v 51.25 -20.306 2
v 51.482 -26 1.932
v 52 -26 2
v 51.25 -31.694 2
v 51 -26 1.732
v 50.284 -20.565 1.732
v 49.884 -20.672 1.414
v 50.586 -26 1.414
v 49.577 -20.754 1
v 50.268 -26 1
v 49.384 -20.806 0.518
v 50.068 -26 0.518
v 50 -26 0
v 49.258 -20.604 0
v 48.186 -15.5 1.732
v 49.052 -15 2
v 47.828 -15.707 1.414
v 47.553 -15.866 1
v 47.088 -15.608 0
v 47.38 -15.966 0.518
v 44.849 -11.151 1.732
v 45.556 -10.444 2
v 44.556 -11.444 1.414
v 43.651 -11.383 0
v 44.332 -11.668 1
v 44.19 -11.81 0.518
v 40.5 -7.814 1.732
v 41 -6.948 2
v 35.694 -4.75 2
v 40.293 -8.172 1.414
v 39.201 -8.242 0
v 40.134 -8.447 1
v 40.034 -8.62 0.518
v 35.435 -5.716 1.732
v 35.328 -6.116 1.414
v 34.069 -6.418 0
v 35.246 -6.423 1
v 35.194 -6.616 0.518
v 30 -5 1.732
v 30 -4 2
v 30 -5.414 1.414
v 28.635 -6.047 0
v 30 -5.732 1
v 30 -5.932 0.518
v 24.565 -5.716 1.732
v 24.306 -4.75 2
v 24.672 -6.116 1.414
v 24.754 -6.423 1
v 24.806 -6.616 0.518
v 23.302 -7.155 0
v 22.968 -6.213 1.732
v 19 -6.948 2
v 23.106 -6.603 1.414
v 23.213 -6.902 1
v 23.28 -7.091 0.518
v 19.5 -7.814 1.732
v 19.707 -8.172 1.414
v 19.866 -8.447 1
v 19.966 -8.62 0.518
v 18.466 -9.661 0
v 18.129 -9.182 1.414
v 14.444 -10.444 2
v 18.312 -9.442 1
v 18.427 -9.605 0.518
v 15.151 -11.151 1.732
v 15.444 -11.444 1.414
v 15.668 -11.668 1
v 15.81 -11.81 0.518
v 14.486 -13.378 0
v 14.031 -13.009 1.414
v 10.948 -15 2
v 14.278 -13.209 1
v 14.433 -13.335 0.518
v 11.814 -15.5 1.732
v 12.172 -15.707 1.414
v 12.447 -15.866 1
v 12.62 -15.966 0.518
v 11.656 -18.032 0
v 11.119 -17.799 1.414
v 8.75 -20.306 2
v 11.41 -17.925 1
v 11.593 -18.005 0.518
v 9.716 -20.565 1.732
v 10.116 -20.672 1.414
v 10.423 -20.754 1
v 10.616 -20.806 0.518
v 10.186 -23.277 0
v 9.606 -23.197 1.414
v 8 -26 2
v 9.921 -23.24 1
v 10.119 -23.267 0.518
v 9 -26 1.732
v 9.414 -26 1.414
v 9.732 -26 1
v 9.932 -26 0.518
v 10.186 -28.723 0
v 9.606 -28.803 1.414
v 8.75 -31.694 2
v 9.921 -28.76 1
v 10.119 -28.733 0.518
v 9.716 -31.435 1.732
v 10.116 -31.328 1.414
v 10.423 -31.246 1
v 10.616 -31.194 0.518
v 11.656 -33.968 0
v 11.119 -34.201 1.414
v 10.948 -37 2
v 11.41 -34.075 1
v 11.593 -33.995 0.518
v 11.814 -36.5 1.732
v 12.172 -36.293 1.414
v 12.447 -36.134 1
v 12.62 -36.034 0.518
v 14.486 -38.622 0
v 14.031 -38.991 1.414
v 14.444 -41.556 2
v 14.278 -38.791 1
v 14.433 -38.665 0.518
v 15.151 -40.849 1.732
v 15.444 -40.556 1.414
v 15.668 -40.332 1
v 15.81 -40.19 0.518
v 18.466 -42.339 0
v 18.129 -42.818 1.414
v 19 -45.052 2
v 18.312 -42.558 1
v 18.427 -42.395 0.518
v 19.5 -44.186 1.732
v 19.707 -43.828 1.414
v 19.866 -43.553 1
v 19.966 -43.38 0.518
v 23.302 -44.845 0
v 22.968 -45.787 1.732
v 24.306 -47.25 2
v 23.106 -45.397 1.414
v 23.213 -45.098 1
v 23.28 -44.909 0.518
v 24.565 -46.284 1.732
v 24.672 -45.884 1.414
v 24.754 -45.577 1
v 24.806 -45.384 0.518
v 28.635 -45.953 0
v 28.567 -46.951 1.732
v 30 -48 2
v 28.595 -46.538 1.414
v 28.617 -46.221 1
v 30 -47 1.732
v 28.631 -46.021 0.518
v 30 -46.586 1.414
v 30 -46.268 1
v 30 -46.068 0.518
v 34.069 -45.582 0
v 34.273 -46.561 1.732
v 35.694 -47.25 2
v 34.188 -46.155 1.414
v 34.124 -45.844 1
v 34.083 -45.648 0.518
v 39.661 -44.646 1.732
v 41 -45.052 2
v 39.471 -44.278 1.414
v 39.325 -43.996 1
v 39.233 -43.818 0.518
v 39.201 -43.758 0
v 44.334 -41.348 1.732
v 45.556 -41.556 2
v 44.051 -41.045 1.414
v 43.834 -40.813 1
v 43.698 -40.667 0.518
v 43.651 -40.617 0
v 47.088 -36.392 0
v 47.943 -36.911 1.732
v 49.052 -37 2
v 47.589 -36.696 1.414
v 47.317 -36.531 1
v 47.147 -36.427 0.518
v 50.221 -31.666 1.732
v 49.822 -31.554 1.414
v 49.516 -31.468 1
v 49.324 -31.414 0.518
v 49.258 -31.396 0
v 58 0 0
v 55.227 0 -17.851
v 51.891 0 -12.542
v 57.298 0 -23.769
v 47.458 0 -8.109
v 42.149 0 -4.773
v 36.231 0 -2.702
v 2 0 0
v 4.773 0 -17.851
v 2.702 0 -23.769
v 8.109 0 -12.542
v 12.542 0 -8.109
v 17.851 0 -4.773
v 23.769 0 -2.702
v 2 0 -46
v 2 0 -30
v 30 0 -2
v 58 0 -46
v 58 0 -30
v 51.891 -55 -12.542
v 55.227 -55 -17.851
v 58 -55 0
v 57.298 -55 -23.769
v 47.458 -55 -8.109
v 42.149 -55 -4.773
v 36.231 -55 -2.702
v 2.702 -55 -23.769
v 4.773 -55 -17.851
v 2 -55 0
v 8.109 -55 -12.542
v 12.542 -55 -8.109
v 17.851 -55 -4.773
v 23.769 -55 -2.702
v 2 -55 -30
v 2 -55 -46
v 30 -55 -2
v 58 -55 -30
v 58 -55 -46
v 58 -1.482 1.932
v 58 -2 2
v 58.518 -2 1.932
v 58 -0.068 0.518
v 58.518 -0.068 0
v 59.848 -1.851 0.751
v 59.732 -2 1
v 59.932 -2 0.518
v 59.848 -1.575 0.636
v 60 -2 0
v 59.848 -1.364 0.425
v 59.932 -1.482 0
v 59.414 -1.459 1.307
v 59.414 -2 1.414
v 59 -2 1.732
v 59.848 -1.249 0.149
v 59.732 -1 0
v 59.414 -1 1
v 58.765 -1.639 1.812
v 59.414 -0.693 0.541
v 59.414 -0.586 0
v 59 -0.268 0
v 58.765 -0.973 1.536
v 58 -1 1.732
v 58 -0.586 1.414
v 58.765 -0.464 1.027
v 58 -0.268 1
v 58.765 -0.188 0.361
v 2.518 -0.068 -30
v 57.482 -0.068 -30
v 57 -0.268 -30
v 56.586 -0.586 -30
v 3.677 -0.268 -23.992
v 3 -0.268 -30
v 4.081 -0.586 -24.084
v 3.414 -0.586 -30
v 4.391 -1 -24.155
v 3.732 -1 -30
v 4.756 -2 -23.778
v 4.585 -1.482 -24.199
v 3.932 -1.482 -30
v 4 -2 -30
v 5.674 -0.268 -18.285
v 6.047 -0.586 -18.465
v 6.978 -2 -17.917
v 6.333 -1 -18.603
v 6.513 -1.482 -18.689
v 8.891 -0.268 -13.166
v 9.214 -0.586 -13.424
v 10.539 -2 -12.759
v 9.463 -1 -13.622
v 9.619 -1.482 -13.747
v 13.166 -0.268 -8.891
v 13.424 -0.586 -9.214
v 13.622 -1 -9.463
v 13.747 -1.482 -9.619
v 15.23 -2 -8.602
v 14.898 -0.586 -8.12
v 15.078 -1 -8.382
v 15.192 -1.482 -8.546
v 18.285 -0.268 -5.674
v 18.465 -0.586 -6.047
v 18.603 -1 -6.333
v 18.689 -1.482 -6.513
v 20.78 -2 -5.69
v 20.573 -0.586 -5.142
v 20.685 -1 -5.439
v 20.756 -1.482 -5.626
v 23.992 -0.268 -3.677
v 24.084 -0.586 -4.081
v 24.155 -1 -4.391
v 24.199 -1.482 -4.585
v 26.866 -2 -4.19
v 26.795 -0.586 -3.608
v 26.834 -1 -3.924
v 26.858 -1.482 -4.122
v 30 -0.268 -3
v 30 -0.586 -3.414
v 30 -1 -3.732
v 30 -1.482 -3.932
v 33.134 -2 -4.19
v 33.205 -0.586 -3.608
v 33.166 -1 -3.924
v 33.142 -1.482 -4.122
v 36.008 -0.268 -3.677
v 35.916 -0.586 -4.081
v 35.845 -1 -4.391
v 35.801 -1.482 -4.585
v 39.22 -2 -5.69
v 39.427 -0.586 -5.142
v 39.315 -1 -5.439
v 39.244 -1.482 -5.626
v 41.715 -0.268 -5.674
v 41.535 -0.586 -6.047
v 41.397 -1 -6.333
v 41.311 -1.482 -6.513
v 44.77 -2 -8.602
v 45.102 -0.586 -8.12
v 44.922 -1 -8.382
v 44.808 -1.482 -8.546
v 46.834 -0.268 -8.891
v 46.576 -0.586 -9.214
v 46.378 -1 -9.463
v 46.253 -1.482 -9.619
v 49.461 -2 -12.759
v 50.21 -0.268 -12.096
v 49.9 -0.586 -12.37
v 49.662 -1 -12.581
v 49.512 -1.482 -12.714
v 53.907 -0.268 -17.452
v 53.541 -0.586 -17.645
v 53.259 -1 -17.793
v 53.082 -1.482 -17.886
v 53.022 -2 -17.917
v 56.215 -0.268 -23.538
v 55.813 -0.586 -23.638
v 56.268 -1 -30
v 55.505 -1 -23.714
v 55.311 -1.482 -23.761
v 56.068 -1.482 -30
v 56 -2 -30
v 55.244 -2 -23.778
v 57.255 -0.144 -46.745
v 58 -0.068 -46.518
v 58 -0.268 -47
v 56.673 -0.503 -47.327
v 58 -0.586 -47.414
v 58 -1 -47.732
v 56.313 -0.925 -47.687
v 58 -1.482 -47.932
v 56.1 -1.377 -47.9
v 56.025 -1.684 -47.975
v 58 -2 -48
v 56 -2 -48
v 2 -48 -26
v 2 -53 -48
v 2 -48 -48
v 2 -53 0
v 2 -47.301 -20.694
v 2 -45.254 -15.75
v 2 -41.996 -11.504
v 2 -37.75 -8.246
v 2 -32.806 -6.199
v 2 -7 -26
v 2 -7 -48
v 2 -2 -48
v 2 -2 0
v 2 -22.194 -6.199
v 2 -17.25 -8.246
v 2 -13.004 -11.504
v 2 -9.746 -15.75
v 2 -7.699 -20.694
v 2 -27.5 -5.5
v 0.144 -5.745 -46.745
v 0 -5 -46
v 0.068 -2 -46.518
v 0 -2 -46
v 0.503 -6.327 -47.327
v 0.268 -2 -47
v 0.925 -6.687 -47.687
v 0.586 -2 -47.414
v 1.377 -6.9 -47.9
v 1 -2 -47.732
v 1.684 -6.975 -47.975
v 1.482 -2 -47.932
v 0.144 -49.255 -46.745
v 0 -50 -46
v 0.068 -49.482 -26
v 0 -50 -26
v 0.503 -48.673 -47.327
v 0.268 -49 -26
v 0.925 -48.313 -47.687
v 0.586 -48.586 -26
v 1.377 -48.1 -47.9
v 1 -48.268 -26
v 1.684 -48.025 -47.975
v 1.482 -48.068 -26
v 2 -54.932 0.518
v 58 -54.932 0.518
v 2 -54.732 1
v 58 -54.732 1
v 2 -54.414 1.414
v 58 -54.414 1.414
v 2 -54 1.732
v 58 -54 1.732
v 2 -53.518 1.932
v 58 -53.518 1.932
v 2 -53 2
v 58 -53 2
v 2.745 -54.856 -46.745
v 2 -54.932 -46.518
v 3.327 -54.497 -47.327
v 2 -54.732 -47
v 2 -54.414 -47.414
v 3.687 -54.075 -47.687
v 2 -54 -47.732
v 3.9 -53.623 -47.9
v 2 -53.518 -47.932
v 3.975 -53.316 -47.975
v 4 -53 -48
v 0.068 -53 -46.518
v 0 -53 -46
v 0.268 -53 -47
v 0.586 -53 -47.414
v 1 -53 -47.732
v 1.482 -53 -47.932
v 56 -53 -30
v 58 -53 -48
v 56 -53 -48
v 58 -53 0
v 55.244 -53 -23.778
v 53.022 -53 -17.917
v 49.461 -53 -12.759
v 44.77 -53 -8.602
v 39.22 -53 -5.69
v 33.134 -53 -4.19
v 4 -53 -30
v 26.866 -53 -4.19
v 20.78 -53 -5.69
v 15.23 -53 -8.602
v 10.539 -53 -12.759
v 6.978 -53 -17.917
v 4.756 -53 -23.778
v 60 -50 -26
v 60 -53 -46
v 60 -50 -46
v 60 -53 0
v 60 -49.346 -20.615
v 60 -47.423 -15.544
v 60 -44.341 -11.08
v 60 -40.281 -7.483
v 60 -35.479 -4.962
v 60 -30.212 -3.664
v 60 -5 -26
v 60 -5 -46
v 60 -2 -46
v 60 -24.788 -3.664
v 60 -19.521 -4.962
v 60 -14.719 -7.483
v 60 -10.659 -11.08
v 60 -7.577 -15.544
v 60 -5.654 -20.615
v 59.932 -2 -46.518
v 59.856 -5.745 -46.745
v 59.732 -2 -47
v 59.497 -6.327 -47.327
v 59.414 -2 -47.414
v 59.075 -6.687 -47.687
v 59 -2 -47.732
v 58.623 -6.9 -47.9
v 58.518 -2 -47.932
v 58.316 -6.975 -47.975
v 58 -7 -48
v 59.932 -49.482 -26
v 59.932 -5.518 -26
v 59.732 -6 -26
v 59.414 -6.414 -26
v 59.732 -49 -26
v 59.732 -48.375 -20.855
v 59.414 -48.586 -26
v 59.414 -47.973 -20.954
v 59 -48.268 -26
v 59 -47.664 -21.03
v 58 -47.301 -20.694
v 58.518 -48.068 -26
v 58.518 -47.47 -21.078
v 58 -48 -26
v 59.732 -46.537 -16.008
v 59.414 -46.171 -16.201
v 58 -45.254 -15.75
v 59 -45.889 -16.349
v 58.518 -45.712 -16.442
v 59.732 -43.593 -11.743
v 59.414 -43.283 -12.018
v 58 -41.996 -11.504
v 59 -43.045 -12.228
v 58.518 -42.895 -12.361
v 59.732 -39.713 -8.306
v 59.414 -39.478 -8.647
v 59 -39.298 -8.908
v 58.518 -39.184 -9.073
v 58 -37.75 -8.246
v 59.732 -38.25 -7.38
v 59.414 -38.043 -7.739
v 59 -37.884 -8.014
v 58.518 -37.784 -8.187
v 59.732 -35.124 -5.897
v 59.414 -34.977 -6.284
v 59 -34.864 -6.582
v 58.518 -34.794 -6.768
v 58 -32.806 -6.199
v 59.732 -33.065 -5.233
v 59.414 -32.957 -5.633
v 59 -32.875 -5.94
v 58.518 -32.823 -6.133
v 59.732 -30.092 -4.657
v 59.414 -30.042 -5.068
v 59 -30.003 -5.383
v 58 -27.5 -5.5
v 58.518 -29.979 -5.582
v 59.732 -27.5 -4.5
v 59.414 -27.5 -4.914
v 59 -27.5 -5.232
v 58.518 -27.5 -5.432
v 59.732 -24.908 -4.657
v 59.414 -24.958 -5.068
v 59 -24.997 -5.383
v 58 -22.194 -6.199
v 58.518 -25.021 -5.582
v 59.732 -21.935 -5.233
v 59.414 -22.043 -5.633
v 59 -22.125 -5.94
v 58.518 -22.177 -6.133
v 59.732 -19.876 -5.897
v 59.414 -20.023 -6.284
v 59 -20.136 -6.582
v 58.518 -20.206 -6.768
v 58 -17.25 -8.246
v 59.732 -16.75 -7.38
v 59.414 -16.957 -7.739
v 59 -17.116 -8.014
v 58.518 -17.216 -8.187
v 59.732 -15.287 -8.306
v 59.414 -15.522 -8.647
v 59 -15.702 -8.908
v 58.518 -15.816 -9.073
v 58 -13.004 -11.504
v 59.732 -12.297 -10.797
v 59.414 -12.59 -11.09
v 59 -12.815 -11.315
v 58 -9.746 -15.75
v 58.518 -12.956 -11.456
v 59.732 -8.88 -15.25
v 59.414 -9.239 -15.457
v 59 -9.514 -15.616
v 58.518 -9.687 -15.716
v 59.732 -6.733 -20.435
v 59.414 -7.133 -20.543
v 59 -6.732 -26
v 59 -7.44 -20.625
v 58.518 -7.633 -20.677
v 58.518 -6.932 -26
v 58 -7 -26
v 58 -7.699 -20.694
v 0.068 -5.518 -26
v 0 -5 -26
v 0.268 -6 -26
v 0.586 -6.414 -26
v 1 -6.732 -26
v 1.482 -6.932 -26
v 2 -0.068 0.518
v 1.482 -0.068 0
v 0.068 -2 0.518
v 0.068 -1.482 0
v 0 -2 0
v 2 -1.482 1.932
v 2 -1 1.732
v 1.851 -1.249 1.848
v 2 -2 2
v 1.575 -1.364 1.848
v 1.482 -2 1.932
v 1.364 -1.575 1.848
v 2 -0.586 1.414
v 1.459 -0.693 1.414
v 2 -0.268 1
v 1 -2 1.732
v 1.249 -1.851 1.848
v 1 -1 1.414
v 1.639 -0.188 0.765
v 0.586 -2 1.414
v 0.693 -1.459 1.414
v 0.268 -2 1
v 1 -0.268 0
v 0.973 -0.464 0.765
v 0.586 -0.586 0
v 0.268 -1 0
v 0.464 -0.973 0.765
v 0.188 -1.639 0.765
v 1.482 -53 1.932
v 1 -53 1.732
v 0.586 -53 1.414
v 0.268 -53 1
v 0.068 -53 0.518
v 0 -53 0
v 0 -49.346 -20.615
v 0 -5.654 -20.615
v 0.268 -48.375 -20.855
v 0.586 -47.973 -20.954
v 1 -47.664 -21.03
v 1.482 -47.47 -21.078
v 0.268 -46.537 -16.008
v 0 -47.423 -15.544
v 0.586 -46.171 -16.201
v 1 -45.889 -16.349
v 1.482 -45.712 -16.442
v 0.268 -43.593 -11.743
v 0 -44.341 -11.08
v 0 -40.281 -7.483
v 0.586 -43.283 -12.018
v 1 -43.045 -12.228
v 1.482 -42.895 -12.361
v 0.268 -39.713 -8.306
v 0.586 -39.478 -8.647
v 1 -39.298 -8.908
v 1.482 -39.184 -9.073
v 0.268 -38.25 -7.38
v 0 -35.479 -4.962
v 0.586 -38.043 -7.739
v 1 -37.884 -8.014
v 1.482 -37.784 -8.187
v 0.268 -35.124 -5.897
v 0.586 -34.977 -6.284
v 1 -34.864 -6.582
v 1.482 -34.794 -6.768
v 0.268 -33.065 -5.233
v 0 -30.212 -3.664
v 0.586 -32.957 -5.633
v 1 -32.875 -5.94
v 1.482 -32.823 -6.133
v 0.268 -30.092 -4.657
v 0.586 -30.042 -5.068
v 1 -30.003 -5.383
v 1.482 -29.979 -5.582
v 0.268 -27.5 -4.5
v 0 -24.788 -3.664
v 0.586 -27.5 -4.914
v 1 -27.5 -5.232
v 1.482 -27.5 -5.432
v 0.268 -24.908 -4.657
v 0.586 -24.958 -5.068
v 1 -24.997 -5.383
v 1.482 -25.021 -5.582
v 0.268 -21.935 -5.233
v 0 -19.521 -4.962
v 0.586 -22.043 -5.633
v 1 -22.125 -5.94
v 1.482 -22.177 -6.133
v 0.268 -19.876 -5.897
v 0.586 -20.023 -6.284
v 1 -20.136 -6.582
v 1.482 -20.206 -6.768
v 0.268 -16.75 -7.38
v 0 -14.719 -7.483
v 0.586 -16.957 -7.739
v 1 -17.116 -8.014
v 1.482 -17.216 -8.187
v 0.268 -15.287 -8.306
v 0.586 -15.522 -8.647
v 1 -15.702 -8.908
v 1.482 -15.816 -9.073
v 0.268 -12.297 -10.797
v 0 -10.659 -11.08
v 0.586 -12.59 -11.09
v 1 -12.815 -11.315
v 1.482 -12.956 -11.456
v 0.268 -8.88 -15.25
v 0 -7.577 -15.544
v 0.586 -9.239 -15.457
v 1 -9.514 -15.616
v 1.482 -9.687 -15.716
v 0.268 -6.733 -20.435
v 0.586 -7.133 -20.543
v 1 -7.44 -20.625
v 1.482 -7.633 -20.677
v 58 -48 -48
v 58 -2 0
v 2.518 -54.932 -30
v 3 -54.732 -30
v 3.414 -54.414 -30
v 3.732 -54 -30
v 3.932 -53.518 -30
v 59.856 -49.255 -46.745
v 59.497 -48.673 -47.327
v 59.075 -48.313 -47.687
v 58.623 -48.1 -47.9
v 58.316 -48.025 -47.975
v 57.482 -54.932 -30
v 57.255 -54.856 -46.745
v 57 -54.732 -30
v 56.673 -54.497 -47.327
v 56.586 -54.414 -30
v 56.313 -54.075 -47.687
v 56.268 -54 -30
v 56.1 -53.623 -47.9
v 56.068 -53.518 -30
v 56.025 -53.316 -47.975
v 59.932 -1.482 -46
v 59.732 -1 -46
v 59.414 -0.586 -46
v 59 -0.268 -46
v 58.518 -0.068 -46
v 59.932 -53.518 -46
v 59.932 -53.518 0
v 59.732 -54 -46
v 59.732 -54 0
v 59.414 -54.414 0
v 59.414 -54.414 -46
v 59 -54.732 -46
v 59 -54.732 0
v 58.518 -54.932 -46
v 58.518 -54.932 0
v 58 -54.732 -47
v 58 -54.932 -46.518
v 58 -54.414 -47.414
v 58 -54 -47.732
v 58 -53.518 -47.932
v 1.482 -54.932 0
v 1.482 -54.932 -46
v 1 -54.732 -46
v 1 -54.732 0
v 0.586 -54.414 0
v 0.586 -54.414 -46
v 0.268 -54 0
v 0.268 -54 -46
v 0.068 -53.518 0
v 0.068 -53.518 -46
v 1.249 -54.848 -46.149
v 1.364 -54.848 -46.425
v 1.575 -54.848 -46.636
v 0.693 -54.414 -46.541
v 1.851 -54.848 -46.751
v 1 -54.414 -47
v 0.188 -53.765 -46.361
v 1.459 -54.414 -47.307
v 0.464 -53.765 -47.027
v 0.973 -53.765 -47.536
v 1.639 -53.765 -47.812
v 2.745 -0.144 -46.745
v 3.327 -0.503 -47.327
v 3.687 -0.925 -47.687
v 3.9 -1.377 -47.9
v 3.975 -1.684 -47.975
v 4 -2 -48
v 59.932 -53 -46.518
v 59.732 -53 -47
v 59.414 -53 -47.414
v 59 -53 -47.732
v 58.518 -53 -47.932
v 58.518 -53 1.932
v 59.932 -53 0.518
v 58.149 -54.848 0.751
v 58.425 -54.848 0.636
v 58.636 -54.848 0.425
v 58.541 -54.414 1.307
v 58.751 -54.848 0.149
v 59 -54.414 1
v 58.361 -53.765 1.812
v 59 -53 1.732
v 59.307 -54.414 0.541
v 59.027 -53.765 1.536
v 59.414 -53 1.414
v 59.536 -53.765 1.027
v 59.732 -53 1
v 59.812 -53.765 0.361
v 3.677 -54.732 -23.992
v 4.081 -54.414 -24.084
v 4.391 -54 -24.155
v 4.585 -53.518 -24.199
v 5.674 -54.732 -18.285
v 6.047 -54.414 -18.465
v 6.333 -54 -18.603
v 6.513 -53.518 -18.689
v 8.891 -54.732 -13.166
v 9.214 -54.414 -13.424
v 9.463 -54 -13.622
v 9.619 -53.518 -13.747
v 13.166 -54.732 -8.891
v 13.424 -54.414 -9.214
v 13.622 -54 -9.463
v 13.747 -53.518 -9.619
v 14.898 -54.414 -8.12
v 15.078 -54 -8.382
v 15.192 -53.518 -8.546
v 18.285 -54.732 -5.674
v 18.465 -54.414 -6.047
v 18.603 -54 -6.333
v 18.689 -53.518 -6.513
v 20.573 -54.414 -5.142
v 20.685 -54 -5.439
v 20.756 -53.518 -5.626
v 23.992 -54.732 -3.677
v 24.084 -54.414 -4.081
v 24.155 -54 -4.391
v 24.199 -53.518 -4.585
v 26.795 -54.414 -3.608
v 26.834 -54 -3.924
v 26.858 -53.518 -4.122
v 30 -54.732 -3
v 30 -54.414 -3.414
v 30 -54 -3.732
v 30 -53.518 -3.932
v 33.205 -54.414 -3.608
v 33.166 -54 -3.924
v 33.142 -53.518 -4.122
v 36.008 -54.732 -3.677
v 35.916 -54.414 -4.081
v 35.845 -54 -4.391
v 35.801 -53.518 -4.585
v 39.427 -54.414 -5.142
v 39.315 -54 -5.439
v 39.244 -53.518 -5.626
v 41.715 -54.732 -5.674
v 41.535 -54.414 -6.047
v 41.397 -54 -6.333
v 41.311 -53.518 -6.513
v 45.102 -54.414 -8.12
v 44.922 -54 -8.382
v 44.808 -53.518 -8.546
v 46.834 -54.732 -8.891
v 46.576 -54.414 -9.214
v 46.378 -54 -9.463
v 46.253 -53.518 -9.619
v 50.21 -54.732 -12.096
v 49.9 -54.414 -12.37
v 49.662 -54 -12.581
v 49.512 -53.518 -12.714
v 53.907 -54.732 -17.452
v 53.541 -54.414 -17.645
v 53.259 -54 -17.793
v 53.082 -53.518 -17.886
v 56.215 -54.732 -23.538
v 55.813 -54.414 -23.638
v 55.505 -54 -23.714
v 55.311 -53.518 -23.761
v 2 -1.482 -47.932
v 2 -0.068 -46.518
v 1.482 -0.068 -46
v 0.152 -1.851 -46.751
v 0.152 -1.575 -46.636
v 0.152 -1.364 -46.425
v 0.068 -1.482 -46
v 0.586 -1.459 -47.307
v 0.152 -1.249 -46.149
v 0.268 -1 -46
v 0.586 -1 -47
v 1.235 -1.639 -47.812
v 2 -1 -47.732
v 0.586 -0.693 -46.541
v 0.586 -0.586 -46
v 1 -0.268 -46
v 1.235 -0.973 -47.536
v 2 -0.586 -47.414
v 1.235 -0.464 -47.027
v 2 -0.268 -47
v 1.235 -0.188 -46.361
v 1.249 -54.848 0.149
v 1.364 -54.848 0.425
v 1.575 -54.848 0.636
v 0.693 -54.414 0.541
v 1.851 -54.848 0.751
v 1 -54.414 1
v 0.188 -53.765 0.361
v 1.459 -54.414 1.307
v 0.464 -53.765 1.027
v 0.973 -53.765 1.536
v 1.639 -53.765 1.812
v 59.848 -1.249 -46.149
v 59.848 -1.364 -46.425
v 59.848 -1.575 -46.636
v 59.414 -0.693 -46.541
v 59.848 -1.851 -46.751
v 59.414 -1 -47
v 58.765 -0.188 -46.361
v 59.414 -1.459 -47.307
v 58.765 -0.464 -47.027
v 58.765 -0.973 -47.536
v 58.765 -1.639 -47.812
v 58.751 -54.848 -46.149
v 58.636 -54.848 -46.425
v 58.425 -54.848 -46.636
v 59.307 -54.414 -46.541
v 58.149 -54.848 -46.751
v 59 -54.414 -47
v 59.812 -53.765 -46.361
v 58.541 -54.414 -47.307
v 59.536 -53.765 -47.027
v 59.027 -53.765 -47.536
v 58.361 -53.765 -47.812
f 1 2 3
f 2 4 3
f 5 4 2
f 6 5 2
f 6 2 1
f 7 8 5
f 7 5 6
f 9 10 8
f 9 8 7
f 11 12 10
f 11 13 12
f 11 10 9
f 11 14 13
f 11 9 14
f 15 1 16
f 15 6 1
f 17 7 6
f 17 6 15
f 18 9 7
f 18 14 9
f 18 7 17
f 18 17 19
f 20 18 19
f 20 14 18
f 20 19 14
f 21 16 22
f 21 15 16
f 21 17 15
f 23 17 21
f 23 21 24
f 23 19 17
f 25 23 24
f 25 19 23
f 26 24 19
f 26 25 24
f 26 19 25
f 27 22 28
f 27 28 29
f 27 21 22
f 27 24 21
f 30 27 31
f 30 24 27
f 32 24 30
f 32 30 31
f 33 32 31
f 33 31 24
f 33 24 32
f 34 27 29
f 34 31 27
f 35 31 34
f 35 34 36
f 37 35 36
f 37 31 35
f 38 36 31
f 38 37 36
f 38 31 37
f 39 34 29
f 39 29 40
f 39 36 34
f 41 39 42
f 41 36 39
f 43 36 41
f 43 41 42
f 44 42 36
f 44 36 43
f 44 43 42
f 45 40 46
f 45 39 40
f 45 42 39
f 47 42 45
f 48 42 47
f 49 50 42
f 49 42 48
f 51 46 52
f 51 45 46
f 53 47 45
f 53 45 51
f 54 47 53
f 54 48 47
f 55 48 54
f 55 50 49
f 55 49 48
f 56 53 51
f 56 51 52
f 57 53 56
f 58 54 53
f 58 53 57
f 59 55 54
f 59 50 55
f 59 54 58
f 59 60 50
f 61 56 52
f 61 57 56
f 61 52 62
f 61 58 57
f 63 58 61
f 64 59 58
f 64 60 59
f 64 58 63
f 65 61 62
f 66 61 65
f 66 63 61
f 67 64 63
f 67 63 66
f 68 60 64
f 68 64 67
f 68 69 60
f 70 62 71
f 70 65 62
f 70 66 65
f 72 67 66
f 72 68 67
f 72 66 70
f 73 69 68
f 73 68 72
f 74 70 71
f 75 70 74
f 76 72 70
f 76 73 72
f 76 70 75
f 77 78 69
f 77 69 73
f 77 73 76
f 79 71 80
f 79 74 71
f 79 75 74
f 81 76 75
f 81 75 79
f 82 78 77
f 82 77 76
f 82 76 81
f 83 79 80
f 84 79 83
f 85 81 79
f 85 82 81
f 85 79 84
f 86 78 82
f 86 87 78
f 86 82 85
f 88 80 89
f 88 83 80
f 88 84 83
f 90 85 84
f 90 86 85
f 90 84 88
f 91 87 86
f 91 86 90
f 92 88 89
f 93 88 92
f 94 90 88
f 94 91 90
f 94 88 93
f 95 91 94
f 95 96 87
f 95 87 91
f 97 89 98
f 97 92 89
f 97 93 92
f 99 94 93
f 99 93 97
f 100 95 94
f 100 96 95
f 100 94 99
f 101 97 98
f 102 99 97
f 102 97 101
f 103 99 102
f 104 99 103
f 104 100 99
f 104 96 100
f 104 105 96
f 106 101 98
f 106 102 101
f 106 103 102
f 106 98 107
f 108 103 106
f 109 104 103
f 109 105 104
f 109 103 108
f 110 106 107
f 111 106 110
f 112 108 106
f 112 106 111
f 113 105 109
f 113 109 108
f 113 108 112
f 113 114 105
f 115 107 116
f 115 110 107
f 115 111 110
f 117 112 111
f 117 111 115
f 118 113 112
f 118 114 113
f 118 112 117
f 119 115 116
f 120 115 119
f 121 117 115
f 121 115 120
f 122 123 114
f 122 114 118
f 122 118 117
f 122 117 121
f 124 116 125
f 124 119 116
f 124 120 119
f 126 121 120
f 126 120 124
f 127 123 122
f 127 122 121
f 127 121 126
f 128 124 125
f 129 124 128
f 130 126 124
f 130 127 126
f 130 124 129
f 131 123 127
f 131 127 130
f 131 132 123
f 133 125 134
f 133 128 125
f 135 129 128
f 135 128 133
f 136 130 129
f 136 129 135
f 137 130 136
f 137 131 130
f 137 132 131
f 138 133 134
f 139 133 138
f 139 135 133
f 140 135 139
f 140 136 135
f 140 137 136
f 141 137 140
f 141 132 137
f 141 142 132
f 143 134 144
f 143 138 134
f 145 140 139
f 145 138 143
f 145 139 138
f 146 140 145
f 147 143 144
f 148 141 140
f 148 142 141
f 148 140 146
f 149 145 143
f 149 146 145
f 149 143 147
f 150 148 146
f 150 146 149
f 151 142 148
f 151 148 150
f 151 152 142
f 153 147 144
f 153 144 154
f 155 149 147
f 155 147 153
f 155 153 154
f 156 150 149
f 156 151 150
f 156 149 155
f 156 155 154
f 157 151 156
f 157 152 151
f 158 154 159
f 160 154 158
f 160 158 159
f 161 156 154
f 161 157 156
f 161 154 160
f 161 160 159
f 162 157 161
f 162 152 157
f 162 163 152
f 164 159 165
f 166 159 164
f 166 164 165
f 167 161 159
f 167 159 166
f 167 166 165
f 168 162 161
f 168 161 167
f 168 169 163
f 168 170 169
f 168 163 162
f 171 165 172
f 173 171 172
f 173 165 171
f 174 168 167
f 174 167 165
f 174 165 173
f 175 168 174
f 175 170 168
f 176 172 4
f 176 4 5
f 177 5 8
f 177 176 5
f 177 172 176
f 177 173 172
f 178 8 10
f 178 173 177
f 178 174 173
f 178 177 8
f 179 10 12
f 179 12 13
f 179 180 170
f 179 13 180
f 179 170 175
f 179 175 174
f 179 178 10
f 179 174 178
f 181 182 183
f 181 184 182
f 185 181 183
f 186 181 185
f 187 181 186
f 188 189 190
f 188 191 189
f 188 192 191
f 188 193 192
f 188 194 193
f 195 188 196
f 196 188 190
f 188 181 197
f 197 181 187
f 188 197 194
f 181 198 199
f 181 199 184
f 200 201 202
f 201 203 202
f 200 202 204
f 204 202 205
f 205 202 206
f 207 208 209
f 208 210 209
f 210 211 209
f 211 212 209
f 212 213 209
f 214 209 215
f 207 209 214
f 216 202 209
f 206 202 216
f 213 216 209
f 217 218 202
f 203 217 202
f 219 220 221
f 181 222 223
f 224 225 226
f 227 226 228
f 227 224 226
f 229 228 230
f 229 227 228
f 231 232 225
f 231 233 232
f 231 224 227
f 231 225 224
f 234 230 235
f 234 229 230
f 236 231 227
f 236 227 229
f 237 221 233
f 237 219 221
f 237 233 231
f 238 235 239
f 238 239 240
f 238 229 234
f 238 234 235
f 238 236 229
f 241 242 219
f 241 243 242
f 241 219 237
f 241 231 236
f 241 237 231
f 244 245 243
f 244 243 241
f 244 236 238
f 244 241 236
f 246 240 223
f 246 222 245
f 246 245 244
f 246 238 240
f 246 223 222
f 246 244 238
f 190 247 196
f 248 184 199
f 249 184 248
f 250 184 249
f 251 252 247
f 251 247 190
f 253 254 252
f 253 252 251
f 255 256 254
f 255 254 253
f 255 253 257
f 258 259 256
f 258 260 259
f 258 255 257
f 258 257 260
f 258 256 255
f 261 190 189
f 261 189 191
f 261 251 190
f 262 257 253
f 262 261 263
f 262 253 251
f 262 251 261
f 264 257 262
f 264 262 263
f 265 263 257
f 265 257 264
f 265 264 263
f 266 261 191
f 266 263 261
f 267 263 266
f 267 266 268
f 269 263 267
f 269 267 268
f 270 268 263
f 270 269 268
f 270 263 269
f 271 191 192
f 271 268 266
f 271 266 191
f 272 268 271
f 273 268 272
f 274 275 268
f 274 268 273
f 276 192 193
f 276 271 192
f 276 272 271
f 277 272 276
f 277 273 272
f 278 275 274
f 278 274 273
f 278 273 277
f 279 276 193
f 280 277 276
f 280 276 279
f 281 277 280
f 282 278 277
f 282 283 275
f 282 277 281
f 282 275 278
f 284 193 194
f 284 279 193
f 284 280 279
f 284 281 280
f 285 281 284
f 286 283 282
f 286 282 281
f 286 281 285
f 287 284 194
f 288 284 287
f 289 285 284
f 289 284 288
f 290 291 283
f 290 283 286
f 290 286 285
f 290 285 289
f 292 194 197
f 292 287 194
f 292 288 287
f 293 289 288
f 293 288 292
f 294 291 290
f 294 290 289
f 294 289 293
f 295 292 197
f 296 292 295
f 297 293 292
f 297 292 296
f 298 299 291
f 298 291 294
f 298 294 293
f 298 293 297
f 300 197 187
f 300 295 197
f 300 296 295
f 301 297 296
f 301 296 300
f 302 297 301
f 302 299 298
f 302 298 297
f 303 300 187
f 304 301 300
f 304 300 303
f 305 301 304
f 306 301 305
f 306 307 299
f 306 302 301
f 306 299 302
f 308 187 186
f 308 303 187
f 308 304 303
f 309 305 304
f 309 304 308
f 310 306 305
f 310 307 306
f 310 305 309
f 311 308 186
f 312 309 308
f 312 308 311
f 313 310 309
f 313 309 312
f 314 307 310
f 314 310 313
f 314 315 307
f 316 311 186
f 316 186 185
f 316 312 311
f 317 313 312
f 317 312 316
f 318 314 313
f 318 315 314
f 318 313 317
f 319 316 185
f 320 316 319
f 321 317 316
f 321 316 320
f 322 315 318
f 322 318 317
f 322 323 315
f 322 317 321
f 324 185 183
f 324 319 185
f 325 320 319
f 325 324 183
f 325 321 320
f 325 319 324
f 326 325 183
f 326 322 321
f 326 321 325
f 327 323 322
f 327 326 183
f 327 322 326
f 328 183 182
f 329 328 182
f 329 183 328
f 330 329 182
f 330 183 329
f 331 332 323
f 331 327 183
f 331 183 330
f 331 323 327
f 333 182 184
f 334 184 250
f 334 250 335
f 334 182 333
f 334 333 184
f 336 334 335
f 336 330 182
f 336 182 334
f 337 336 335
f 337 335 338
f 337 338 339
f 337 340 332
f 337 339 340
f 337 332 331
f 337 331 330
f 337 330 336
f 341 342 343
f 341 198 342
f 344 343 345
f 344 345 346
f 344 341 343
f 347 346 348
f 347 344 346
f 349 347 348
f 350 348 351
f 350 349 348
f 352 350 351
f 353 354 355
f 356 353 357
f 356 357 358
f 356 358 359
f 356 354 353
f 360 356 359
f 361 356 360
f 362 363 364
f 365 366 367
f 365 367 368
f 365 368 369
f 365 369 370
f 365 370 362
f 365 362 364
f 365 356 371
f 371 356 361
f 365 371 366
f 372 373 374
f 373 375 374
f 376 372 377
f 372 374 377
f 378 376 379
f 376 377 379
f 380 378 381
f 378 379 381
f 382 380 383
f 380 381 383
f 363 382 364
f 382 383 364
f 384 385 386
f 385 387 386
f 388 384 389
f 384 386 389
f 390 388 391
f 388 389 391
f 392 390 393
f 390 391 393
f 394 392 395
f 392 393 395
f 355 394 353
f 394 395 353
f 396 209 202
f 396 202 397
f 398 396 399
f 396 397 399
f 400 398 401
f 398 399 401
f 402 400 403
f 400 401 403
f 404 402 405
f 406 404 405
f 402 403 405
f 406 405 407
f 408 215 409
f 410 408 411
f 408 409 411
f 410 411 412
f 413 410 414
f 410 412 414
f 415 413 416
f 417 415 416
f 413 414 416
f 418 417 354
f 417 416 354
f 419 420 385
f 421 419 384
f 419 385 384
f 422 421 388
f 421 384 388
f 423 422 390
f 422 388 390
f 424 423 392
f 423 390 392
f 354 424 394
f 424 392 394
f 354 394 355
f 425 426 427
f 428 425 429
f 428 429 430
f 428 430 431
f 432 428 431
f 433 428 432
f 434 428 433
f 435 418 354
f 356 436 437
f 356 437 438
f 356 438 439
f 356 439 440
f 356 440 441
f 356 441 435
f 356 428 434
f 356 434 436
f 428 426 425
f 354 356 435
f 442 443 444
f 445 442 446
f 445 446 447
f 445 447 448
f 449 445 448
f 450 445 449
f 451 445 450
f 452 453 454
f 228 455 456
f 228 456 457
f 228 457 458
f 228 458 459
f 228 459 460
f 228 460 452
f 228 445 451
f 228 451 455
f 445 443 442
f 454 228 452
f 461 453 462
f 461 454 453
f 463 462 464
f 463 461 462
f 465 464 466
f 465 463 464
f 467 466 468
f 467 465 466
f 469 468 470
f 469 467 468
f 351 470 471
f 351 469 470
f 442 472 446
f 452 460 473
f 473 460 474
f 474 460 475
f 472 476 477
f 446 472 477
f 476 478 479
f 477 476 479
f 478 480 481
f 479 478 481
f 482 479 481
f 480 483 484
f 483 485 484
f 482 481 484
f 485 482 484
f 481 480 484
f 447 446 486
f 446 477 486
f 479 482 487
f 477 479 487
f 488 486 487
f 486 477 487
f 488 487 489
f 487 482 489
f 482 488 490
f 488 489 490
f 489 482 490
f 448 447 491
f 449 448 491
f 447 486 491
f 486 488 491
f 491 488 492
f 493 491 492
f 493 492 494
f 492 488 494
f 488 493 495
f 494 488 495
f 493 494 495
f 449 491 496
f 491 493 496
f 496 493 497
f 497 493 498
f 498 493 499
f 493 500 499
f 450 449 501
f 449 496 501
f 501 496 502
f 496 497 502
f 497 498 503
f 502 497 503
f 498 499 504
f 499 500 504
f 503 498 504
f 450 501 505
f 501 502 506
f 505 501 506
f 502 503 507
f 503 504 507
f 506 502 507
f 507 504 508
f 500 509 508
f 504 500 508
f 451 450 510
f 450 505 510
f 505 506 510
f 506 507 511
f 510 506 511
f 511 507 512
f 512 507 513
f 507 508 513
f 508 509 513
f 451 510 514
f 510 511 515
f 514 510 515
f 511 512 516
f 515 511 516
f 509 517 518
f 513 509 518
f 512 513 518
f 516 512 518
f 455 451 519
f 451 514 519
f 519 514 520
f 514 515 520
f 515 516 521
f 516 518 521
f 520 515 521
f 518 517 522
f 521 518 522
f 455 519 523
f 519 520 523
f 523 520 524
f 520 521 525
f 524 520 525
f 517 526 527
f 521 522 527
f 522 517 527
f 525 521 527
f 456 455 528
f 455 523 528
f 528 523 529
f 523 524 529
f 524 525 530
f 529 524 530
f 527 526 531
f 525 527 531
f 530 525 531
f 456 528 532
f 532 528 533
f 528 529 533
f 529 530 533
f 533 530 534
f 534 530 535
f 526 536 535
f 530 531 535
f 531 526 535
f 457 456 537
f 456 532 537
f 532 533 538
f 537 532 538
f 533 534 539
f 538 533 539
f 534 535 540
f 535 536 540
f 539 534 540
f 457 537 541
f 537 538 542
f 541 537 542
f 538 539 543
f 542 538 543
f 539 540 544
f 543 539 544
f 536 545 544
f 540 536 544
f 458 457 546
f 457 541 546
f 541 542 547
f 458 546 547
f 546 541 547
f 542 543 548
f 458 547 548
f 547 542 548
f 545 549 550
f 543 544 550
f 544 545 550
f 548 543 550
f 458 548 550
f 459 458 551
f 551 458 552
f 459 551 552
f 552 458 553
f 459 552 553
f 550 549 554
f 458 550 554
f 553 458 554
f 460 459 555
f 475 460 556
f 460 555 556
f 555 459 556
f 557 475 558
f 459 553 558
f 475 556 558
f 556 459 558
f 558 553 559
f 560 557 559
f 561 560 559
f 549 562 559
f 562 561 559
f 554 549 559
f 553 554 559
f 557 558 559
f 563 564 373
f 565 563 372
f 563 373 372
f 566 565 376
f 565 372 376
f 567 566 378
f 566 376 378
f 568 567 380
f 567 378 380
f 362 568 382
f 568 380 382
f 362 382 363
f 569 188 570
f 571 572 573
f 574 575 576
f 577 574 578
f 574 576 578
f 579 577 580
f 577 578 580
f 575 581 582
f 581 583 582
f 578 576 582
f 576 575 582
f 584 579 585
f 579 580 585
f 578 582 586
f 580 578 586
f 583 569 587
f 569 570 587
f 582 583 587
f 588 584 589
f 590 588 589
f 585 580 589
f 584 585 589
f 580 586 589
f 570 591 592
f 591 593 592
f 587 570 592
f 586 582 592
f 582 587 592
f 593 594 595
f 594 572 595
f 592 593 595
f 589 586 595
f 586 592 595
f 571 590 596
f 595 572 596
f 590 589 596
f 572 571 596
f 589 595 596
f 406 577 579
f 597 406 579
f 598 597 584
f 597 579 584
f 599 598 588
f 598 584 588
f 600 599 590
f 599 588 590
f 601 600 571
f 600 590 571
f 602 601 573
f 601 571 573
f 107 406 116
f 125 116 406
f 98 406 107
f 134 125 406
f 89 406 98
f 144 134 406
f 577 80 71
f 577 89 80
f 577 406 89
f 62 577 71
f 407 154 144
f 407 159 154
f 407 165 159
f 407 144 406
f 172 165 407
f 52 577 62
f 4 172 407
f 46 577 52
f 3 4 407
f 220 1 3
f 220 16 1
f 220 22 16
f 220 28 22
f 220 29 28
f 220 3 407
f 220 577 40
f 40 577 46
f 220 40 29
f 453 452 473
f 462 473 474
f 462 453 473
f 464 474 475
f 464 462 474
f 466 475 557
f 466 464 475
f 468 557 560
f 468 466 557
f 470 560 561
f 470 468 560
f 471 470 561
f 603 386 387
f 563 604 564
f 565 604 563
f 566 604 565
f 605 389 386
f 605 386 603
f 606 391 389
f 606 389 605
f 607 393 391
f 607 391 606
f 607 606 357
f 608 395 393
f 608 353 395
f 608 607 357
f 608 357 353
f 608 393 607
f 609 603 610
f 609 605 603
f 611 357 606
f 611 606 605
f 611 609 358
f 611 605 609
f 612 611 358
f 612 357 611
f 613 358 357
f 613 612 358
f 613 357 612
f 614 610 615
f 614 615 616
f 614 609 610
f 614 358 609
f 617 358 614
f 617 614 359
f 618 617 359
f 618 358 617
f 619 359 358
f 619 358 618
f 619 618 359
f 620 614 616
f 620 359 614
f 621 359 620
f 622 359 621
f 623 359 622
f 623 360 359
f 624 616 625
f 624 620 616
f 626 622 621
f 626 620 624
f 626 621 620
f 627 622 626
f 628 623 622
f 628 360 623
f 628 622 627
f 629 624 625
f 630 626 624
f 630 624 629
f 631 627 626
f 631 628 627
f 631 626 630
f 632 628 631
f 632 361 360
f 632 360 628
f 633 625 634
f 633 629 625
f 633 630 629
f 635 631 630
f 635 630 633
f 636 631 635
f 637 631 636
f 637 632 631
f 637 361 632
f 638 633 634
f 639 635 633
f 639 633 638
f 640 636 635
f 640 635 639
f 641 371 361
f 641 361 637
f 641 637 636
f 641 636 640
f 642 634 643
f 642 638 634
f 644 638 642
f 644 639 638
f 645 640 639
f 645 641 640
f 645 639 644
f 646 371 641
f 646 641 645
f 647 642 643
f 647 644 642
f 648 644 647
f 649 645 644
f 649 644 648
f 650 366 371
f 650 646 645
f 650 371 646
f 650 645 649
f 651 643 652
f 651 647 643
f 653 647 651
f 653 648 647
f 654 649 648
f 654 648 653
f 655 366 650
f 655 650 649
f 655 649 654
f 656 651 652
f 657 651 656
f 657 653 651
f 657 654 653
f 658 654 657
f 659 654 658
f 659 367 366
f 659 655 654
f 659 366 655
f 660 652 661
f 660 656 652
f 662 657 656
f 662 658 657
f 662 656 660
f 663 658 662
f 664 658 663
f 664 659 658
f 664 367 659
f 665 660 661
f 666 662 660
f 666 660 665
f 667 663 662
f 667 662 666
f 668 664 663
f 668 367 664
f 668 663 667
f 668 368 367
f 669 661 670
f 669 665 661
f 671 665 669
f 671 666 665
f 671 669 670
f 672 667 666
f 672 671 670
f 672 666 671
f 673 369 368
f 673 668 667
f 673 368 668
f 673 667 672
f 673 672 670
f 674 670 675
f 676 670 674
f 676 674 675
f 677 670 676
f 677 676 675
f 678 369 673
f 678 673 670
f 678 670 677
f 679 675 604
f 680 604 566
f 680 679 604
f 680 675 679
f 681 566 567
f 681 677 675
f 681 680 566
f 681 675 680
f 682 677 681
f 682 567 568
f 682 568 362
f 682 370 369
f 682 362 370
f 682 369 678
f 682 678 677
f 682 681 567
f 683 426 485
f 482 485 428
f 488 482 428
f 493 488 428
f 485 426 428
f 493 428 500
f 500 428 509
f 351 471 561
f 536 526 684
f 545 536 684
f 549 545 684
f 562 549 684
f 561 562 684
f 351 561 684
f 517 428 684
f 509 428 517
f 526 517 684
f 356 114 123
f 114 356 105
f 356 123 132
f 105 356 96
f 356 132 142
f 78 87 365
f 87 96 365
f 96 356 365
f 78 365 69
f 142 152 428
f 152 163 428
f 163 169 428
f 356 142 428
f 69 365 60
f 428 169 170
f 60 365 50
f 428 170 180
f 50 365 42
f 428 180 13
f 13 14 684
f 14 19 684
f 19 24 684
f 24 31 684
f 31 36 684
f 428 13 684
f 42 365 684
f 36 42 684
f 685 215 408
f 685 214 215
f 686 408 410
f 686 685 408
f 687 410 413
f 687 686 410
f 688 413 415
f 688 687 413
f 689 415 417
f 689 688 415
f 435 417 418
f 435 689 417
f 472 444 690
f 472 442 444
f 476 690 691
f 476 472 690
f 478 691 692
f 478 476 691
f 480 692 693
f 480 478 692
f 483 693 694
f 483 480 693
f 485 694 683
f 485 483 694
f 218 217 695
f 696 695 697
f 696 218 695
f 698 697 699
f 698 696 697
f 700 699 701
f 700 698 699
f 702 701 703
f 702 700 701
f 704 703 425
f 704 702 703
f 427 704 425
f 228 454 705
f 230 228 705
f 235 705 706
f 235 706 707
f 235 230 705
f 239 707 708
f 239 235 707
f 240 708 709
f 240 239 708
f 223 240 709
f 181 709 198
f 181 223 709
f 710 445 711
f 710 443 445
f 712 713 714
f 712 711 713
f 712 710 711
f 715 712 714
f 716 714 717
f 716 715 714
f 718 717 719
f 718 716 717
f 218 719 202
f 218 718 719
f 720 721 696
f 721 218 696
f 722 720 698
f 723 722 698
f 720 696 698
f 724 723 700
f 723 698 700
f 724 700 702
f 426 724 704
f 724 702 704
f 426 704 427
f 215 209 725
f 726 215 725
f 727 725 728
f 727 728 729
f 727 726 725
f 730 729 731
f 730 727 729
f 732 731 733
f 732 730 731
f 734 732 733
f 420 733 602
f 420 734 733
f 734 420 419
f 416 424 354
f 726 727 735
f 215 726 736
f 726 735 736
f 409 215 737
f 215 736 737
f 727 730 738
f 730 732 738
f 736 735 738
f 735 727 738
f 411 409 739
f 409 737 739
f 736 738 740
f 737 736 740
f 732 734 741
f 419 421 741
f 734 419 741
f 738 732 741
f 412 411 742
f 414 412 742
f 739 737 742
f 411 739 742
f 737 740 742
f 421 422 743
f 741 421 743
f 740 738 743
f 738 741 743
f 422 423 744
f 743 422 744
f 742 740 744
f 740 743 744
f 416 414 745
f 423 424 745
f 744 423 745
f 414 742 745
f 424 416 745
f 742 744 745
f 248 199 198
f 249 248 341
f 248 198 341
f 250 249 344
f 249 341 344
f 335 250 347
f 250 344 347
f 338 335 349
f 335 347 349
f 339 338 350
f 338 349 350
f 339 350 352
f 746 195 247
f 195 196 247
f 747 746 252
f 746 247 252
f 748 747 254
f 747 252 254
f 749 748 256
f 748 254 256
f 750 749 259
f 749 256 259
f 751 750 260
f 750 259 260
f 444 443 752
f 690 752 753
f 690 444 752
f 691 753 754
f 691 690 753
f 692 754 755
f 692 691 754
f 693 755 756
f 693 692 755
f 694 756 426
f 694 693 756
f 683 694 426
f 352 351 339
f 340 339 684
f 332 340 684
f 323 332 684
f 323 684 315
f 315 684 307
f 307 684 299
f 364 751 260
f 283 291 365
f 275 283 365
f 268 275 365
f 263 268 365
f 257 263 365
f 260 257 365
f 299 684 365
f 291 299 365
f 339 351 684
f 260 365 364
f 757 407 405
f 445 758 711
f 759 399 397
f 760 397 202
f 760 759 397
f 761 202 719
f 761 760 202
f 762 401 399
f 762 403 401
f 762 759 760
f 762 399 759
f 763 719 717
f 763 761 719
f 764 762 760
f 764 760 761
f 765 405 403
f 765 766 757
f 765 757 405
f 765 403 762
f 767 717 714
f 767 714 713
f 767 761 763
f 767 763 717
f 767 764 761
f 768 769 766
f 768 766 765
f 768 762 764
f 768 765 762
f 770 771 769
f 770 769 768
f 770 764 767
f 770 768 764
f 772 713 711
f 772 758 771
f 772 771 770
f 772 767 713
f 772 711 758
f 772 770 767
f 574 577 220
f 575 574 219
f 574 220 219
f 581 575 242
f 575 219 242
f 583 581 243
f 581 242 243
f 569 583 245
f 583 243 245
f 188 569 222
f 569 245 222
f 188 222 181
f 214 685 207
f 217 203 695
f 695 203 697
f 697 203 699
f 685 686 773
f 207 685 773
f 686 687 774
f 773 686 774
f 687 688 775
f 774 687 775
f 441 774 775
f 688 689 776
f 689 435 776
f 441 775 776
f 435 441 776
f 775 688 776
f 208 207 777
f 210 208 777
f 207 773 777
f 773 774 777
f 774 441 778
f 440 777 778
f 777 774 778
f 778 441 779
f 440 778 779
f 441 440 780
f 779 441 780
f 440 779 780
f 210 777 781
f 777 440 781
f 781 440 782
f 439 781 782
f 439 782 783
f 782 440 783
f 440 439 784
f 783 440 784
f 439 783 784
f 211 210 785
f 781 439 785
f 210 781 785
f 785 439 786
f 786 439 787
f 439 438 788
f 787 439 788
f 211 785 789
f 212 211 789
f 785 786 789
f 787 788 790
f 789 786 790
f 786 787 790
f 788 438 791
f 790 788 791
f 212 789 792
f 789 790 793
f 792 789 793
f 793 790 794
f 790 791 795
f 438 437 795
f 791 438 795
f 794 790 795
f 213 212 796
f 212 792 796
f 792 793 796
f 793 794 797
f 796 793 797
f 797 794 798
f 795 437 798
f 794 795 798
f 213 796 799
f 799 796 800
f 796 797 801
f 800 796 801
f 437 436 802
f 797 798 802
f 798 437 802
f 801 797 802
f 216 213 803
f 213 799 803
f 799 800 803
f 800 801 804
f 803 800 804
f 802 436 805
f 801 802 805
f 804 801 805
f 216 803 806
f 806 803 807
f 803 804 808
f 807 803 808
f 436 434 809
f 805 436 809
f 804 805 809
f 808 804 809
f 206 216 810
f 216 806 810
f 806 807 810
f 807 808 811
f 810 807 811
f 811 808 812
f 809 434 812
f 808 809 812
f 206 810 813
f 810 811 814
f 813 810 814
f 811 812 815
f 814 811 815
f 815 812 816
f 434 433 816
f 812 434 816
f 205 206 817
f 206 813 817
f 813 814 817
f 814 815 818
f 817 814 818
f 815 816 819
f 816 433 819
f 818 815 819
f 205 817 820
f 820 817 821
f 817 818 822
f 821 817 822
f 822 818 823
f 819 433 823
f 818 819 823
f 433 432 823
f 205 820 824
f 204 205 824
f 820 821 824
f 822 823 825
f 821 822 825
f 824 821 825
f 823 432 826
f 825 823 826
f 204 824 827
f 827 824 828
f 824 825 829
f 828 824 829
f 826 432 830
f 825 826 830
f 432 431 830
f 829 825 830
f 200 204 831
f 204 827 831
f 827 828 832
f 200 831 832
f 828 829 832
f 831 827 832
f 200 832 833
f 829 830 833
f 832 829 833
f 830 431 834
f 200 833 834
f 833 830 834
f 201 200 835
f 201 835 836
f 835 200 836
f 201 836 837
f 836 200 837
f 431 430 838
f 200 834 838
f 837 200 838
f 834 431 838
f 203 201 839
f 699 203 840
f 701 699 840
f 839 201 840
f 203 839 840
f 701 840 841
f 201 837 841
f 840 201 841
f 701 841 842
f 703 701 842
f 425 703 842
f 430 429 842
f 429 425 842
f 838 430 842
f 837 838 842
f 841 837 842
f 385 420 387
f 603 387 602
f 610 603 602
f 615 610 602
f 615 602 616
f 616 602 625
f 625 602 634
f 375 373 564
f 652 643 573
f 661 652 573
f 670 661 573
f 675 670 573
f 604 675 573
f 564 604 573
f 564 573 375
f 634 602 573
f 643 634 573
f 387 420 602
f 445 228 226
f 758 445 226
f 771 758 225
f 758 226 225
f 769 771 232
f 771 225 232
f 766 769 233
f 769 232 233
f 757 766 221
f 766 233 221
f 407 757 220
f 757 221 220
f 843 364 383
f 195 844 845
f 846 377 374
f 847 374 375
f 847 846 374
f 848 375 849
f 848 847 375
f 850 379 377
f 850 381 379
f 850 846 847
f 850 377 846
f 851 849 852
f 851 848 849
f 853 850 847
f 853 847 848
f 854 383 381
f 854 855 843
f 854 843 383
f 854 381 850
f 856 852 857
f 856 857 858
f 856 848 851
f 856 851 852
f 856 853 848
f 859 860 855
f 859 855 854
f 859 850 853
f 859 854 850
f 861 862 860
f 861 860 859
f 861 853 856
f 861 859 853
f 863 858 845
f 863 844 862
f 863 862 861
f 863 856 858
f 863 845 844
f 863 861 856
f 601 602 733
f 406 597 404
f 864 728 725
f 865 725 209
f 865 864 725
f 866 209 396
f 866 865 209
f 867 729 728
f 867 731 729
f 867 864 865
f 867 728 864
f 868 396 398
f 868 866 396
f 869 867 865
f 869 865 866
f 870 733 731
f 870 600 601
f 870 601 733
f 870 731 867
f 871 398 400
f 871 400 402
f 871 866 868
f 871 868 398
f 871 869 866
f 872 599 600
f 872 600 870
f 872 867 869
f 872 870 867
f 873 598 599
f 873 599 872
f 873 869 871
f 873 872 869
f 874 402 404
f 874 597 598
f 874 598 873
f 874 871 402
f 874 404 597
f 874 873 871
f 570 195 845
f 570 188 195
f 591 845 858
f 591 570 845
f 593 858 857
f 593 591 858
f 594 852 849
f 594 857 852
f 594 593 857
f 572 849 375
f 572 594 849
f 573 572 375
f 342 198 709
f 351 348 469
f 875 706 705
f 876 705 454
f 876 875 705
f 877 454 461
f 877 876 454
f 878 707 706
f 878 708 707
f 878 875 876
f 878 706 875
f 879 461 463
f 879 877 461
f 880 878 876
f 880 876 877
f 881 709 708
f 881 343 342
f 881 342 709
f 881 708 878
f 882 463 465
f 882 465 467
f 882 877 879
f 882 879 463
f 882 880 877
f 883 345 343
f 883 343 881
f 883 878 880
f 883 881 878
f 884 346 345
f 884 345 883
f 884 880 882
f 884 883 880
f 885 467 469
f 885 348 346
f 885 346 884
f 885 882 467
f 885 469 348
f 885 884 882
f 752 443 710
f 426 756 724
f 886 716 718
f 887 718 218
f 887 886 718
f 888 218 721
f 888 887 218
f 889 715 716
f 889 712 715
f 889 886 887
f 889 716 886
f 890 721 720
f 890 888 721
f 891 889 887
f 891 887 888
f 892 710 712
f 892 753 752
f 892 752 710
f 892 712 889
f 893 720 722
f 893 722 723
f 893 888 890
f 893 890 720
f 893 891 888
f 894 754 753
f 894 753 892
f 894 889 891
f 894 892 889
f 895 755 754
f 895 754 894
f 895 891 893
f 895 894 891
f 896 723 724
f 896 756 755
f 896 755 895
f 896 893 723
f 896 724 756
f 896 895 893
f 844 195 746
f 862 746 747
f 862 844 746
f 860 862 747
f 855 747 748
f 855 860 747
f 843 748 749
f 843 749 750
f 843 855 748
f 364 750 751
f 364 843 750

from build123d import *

# Parameters (mm, degrees)
SKETCH_1_W          = 60
SKETCH_1_H          = 55
SKETCH_1_R          = 20
EXTRUDE_1_DEPTH     = 2
SKETCH_2_W          = 60
SKETCH_2_H          = 55
SKETCH_2_W_2        = 56
SKETCH_2_H_2        = 51
EXTRUDE_2_DEPTH     = 48
CUT_EXTRUDE_1_REACH = 96.493
CUT_EXTRUDE_2_REACH = 96.493
FILLET_1_R          = 2


with BuildPart() as part:
    # 草图1 → 凸台-拉伸1 (new body)
    with BuildSketch(Plane.XY):
        with Locations((30, -27.5)):
            Rectangle(SKETCH_1_W, SKETCH_1_H)
        with Locations((30, -26)):
            Circle(SKETCH_1_R, mode=Mode.SUBTRACT)
    extrude(amount=EXTRUDE_1_DEPTH)

    # 草图2 → 凸台-拉伸2 (add)
    with BuildSketch(Plane(origin=(0, 0, 0), x_dir=(-1, 0, 0), z_dir=(0, 0, -1))):
        with Locations((-30, -27.5)):
            Rectangle(SKETCH_2_W, SKETCH_2_H)
        with Locations((-30, -27.5)):
            Rectangle(SKETCH_2_W_2, SKETCH_2_H_2, mode=Mode.SUBTRACT)
    extrude(amount=EXTRUDE_2_DEPTH)

    # 切除-拉伸1: up to this face of the body (flat: up to its plane)
    cut_extrude_1_end = Plane(part.part.faces().sort_by_distance((30, 0, -23))[0])
    # 草图3 → 切除-拉伸1 (cut, up to the picked face)
    with BuildSketch(Plane.XZ.offset(55), mode=Mode.PRIVATE) as cut_extrude_1_sk1:
        with BuildLine():
            Line((30, -48), (4, -48))
            Line((4, -48), (4, -30))
            ThreePointArc((4, -30), (30, -4), (56, -30))
            Line((56, -30), (56, -48))
            Line((56, -48), (30, -48))
        make_face()
    cut_extrude_1_tool1 = split(extrude(cut_extrude_1_sk1.sketch, amount=-CUT_EXTRUDE_1_REACH, mode=Mode.PRIVATE), bisect_by=cut_extrude_1_end, keep=Keep.BOTH, mode=Mode.PRIVATE)
    add(cut_extrude_1_tool1.solids().sort_by(Axis((30, -55, -28.351568), (0, 1, 0)))[0], mode=Mode.SUBTRACT)

    # 切除-拉伸2: up to this face of the body (flat: up to its plane)
    cut_extrude_2_end = Plane(part.part.faces().sort_by_distance((60, -27.5, -23))[0])
    # 草图4 → 切除-拉伸2 (cut, up to the picked face)
    with BuildSketch(Plane.ZY, mode=Mode.PRIVATE) as cut_extrude_2_sk1:
        with BuildLine():
            Line((-26, -7), (-48, -7))
            Line((-48, -7), (-48, -48))
            Line((-48, -48), (-26, -48))
            ThreePointArc((-26, -48), (-5.5, -27.5), (-26, -7))
        make_face()
    cut_extrude_2_tool1 = split(extrude(cut_extrude_2_sk1.sketch, amount=-CUT_EXTRUDE_2_REACH, mode=Mode.PRIVATE), bisect_by=cut_extrude_2_end, keep=Keep.BOTH, mode=Mode.PRIVATE)
    add(cut_extrude_2_tool1.solids().sort_by(Axis((0, -27.5, -28.674932), (1, 0, 0)))[0], mode=Mode.SUBTRACT)

    # 圆角1
    fillet_1_edges = [part.edges().sort_by_distance(p)[0] for p in [
        (56, 0, -39),
        (58, 0, -48),
        (2, 0, -48),
        (4, 0, -39),
        (30, 0, -4),
        (0, -7, -37),
        (0, -3.5, -48),
        (0, 0, -23),
        (0, -51.5, -48),
        (0, -48, -37),
        (0, -27.5, -5.5),
        (10, -26, 2),
        (30, 0, 2),
        (0, -27.5, 2),
        (60, -27.5, 2),
        (60, 0, -23),
        (60, -3.5, -48),
        (60, -7, -37),
        (60, -27.5, -5.5),
        (60, -48, -37),
        (60, -51.5, -48),
        (0, -55, -23),
        (30, -55, 2),
        (60, -55, -23),
        (58, -55, -48),
        (56, -55, -39),
        (30, -55, -4),
        (4, -55, -39),
        (2, -55, -48),
    ]]
    fillet(fillet_1_edges, radius=FILLET_1_R - 0.0001)  # a hair under: the kernel refuses the full size


solid = part.part
